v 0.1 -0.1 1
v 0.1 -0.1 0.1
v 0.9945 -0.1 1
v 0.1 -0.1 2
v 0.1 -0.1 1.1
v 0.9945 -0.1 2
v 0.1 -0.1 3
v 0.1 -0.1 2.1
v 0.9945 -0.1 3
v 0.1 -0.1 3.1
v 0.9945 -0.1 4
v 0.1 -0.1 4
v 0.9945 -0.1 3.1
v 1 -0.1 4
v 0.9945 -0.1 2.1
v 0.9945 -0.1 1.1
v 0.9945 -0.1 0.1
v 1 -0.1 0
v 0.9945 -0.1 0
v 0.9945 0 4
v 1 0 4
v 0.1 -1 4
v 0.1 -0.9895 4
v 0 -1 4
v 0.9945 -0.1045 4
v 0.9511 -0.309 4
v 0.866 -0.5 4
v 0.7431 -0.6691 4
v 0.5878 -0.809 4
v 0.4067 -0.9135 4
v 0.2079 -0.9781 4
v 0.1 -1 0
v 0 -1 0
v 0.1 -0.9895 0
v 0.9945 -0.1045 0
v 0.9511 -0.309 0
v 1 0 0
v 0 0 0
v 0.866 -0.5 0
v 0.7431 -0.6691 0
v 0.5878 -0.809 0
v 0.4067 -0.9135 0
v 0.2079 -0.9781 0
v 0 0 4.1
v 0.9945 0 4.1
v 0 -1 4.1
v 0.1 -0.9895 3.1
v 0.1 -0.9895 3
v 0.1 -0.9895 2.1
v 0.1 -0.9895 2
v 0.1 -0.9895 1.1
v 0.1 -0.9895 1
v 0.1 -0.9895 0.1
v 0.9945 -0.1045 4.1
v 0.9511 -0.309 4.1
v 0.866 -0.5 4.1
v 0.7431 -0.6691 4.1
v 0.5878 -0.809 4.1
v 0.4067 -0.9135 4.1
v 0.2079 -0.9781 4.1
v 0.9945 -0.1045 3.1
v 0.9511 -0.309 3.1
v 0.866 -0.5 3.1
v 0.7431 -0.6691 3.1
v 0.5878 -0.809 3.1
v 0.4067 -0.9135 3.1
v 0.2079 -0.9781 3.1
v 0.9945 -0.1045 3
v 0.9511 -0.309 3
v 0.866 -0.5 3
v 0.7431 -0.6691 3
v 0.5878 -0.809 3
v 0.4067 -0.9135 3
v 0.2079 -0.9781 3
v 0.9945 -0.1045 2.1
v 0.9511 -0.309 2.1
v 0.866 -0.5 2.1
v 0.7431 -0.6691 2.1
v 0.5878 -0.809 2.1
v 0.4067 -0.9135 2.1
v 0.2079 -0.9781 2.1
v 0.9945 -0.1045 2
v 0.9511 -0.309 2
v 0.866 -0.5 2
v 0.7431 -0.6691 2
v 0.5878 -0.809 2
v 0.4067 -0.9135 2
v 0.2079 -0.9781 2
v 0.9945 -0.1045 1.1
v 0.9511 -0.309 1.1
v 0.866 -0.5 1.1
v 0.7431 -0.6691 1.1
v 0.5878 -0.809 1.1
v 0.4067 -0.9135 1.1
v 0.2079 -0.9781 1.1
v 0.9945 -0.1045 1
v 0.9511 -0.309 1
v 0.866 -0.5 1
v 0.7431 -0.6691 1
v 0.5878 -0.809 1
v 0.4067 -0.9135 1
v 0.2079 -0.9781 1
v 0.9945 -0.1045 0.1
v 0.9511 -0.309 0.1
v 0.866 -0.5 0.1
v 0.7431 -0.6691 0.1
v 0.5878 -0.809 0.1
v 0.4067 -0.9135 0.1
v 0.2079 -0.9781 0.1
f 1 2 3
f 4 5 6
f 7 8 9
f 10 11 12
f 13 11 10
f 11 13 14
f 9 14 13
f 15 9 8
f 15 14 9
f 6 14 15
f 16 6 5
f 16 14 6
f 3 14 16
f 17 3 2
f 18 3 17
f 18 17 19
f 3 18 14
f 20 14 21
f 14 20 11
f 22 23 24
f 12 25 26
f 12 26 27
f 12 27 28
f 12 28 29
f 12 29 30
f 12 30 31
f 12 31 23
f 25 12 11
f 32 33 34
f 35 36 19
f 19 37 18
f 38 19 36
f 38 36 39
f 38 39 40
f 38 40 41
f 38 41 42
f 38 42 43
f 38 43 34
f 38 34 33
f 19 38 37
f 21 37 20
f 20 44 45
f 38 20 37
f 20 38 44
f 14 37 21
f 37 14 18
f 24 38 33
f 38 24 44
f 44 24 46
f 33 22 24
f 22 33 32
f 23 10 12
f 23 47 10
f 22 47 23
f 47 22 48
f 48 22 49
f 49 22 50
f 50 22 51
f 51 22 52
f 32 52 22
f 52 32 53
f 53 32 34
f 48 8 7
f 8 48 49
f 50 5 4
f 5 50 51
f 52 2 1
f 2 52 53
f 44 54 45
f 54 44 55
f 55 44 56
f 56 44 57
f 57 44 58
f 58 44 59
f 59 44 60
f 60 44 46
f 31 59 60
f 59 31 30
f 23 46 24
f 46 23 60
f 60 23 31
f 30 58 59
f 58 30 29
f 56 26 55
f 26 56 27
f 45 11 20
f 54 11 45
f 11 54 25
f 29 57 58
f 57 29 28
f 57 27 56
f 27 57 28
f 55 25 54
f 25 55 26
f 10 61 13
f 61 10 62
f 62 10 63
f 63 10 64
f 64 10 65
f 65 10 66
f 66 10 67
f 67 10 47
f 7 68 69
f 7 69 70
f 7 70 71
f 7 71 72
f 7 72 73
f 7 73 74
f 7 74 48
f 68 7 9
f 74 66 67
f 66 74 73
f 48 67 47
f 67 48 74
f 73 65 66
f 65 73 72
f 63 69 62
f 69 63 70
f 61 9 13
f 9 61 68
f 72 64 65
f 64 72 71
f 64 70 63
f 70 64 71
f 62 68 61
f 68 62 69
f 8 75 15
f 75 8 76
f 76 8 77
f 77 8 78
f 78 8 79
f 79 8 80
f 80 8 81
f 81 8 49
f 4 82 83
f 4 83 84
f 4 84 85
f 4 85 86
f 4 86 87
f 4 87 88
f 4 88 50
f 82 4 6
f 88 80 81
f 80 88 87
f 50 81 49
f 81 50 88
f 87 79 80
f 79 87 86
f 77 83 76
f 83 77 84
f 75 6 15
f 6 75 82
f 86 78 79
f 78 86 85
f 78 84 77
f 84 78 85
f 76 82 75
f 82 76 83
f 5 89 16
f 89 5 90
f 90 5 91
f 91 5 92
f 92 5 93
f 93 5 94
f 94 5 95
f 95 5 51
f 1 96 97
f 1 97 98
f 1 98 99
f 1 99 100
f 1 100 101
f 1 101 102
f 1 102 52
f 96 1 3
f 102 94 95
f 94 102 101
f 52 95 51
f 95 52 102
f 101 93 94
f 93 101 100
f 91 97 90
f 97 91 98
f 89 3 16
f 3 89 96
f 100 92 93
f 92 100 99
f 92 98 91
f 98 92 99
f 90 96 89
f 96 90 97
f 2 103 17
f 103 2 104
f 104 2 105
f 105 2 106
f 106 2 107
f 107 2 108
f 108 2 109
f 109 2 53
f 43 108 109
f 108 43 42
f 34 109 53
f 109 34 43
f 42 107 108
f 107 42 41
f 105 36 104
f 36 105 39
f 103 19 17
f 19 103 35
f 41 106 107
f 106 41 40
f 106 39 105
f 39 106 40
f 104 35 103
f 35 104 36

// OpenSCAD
module shelf(){

intersection(){
    cube([3,3,0.1]);
    cylinder(2,1,1,center = true, $fn = 30);

}
}


rotate([0,0,270]){
color("#AF7244"){
cube([0.1,1,4]);

cube([1,0.1,4]);

}

color("#FBC490"){

translate([0,0,4])
shelf();

translate([0,0,3])
shelf();

translate([0,0,2])
shelf();

translate([0,0,1])
shelf();

translate([0,0,0])
shelf();
}
}
